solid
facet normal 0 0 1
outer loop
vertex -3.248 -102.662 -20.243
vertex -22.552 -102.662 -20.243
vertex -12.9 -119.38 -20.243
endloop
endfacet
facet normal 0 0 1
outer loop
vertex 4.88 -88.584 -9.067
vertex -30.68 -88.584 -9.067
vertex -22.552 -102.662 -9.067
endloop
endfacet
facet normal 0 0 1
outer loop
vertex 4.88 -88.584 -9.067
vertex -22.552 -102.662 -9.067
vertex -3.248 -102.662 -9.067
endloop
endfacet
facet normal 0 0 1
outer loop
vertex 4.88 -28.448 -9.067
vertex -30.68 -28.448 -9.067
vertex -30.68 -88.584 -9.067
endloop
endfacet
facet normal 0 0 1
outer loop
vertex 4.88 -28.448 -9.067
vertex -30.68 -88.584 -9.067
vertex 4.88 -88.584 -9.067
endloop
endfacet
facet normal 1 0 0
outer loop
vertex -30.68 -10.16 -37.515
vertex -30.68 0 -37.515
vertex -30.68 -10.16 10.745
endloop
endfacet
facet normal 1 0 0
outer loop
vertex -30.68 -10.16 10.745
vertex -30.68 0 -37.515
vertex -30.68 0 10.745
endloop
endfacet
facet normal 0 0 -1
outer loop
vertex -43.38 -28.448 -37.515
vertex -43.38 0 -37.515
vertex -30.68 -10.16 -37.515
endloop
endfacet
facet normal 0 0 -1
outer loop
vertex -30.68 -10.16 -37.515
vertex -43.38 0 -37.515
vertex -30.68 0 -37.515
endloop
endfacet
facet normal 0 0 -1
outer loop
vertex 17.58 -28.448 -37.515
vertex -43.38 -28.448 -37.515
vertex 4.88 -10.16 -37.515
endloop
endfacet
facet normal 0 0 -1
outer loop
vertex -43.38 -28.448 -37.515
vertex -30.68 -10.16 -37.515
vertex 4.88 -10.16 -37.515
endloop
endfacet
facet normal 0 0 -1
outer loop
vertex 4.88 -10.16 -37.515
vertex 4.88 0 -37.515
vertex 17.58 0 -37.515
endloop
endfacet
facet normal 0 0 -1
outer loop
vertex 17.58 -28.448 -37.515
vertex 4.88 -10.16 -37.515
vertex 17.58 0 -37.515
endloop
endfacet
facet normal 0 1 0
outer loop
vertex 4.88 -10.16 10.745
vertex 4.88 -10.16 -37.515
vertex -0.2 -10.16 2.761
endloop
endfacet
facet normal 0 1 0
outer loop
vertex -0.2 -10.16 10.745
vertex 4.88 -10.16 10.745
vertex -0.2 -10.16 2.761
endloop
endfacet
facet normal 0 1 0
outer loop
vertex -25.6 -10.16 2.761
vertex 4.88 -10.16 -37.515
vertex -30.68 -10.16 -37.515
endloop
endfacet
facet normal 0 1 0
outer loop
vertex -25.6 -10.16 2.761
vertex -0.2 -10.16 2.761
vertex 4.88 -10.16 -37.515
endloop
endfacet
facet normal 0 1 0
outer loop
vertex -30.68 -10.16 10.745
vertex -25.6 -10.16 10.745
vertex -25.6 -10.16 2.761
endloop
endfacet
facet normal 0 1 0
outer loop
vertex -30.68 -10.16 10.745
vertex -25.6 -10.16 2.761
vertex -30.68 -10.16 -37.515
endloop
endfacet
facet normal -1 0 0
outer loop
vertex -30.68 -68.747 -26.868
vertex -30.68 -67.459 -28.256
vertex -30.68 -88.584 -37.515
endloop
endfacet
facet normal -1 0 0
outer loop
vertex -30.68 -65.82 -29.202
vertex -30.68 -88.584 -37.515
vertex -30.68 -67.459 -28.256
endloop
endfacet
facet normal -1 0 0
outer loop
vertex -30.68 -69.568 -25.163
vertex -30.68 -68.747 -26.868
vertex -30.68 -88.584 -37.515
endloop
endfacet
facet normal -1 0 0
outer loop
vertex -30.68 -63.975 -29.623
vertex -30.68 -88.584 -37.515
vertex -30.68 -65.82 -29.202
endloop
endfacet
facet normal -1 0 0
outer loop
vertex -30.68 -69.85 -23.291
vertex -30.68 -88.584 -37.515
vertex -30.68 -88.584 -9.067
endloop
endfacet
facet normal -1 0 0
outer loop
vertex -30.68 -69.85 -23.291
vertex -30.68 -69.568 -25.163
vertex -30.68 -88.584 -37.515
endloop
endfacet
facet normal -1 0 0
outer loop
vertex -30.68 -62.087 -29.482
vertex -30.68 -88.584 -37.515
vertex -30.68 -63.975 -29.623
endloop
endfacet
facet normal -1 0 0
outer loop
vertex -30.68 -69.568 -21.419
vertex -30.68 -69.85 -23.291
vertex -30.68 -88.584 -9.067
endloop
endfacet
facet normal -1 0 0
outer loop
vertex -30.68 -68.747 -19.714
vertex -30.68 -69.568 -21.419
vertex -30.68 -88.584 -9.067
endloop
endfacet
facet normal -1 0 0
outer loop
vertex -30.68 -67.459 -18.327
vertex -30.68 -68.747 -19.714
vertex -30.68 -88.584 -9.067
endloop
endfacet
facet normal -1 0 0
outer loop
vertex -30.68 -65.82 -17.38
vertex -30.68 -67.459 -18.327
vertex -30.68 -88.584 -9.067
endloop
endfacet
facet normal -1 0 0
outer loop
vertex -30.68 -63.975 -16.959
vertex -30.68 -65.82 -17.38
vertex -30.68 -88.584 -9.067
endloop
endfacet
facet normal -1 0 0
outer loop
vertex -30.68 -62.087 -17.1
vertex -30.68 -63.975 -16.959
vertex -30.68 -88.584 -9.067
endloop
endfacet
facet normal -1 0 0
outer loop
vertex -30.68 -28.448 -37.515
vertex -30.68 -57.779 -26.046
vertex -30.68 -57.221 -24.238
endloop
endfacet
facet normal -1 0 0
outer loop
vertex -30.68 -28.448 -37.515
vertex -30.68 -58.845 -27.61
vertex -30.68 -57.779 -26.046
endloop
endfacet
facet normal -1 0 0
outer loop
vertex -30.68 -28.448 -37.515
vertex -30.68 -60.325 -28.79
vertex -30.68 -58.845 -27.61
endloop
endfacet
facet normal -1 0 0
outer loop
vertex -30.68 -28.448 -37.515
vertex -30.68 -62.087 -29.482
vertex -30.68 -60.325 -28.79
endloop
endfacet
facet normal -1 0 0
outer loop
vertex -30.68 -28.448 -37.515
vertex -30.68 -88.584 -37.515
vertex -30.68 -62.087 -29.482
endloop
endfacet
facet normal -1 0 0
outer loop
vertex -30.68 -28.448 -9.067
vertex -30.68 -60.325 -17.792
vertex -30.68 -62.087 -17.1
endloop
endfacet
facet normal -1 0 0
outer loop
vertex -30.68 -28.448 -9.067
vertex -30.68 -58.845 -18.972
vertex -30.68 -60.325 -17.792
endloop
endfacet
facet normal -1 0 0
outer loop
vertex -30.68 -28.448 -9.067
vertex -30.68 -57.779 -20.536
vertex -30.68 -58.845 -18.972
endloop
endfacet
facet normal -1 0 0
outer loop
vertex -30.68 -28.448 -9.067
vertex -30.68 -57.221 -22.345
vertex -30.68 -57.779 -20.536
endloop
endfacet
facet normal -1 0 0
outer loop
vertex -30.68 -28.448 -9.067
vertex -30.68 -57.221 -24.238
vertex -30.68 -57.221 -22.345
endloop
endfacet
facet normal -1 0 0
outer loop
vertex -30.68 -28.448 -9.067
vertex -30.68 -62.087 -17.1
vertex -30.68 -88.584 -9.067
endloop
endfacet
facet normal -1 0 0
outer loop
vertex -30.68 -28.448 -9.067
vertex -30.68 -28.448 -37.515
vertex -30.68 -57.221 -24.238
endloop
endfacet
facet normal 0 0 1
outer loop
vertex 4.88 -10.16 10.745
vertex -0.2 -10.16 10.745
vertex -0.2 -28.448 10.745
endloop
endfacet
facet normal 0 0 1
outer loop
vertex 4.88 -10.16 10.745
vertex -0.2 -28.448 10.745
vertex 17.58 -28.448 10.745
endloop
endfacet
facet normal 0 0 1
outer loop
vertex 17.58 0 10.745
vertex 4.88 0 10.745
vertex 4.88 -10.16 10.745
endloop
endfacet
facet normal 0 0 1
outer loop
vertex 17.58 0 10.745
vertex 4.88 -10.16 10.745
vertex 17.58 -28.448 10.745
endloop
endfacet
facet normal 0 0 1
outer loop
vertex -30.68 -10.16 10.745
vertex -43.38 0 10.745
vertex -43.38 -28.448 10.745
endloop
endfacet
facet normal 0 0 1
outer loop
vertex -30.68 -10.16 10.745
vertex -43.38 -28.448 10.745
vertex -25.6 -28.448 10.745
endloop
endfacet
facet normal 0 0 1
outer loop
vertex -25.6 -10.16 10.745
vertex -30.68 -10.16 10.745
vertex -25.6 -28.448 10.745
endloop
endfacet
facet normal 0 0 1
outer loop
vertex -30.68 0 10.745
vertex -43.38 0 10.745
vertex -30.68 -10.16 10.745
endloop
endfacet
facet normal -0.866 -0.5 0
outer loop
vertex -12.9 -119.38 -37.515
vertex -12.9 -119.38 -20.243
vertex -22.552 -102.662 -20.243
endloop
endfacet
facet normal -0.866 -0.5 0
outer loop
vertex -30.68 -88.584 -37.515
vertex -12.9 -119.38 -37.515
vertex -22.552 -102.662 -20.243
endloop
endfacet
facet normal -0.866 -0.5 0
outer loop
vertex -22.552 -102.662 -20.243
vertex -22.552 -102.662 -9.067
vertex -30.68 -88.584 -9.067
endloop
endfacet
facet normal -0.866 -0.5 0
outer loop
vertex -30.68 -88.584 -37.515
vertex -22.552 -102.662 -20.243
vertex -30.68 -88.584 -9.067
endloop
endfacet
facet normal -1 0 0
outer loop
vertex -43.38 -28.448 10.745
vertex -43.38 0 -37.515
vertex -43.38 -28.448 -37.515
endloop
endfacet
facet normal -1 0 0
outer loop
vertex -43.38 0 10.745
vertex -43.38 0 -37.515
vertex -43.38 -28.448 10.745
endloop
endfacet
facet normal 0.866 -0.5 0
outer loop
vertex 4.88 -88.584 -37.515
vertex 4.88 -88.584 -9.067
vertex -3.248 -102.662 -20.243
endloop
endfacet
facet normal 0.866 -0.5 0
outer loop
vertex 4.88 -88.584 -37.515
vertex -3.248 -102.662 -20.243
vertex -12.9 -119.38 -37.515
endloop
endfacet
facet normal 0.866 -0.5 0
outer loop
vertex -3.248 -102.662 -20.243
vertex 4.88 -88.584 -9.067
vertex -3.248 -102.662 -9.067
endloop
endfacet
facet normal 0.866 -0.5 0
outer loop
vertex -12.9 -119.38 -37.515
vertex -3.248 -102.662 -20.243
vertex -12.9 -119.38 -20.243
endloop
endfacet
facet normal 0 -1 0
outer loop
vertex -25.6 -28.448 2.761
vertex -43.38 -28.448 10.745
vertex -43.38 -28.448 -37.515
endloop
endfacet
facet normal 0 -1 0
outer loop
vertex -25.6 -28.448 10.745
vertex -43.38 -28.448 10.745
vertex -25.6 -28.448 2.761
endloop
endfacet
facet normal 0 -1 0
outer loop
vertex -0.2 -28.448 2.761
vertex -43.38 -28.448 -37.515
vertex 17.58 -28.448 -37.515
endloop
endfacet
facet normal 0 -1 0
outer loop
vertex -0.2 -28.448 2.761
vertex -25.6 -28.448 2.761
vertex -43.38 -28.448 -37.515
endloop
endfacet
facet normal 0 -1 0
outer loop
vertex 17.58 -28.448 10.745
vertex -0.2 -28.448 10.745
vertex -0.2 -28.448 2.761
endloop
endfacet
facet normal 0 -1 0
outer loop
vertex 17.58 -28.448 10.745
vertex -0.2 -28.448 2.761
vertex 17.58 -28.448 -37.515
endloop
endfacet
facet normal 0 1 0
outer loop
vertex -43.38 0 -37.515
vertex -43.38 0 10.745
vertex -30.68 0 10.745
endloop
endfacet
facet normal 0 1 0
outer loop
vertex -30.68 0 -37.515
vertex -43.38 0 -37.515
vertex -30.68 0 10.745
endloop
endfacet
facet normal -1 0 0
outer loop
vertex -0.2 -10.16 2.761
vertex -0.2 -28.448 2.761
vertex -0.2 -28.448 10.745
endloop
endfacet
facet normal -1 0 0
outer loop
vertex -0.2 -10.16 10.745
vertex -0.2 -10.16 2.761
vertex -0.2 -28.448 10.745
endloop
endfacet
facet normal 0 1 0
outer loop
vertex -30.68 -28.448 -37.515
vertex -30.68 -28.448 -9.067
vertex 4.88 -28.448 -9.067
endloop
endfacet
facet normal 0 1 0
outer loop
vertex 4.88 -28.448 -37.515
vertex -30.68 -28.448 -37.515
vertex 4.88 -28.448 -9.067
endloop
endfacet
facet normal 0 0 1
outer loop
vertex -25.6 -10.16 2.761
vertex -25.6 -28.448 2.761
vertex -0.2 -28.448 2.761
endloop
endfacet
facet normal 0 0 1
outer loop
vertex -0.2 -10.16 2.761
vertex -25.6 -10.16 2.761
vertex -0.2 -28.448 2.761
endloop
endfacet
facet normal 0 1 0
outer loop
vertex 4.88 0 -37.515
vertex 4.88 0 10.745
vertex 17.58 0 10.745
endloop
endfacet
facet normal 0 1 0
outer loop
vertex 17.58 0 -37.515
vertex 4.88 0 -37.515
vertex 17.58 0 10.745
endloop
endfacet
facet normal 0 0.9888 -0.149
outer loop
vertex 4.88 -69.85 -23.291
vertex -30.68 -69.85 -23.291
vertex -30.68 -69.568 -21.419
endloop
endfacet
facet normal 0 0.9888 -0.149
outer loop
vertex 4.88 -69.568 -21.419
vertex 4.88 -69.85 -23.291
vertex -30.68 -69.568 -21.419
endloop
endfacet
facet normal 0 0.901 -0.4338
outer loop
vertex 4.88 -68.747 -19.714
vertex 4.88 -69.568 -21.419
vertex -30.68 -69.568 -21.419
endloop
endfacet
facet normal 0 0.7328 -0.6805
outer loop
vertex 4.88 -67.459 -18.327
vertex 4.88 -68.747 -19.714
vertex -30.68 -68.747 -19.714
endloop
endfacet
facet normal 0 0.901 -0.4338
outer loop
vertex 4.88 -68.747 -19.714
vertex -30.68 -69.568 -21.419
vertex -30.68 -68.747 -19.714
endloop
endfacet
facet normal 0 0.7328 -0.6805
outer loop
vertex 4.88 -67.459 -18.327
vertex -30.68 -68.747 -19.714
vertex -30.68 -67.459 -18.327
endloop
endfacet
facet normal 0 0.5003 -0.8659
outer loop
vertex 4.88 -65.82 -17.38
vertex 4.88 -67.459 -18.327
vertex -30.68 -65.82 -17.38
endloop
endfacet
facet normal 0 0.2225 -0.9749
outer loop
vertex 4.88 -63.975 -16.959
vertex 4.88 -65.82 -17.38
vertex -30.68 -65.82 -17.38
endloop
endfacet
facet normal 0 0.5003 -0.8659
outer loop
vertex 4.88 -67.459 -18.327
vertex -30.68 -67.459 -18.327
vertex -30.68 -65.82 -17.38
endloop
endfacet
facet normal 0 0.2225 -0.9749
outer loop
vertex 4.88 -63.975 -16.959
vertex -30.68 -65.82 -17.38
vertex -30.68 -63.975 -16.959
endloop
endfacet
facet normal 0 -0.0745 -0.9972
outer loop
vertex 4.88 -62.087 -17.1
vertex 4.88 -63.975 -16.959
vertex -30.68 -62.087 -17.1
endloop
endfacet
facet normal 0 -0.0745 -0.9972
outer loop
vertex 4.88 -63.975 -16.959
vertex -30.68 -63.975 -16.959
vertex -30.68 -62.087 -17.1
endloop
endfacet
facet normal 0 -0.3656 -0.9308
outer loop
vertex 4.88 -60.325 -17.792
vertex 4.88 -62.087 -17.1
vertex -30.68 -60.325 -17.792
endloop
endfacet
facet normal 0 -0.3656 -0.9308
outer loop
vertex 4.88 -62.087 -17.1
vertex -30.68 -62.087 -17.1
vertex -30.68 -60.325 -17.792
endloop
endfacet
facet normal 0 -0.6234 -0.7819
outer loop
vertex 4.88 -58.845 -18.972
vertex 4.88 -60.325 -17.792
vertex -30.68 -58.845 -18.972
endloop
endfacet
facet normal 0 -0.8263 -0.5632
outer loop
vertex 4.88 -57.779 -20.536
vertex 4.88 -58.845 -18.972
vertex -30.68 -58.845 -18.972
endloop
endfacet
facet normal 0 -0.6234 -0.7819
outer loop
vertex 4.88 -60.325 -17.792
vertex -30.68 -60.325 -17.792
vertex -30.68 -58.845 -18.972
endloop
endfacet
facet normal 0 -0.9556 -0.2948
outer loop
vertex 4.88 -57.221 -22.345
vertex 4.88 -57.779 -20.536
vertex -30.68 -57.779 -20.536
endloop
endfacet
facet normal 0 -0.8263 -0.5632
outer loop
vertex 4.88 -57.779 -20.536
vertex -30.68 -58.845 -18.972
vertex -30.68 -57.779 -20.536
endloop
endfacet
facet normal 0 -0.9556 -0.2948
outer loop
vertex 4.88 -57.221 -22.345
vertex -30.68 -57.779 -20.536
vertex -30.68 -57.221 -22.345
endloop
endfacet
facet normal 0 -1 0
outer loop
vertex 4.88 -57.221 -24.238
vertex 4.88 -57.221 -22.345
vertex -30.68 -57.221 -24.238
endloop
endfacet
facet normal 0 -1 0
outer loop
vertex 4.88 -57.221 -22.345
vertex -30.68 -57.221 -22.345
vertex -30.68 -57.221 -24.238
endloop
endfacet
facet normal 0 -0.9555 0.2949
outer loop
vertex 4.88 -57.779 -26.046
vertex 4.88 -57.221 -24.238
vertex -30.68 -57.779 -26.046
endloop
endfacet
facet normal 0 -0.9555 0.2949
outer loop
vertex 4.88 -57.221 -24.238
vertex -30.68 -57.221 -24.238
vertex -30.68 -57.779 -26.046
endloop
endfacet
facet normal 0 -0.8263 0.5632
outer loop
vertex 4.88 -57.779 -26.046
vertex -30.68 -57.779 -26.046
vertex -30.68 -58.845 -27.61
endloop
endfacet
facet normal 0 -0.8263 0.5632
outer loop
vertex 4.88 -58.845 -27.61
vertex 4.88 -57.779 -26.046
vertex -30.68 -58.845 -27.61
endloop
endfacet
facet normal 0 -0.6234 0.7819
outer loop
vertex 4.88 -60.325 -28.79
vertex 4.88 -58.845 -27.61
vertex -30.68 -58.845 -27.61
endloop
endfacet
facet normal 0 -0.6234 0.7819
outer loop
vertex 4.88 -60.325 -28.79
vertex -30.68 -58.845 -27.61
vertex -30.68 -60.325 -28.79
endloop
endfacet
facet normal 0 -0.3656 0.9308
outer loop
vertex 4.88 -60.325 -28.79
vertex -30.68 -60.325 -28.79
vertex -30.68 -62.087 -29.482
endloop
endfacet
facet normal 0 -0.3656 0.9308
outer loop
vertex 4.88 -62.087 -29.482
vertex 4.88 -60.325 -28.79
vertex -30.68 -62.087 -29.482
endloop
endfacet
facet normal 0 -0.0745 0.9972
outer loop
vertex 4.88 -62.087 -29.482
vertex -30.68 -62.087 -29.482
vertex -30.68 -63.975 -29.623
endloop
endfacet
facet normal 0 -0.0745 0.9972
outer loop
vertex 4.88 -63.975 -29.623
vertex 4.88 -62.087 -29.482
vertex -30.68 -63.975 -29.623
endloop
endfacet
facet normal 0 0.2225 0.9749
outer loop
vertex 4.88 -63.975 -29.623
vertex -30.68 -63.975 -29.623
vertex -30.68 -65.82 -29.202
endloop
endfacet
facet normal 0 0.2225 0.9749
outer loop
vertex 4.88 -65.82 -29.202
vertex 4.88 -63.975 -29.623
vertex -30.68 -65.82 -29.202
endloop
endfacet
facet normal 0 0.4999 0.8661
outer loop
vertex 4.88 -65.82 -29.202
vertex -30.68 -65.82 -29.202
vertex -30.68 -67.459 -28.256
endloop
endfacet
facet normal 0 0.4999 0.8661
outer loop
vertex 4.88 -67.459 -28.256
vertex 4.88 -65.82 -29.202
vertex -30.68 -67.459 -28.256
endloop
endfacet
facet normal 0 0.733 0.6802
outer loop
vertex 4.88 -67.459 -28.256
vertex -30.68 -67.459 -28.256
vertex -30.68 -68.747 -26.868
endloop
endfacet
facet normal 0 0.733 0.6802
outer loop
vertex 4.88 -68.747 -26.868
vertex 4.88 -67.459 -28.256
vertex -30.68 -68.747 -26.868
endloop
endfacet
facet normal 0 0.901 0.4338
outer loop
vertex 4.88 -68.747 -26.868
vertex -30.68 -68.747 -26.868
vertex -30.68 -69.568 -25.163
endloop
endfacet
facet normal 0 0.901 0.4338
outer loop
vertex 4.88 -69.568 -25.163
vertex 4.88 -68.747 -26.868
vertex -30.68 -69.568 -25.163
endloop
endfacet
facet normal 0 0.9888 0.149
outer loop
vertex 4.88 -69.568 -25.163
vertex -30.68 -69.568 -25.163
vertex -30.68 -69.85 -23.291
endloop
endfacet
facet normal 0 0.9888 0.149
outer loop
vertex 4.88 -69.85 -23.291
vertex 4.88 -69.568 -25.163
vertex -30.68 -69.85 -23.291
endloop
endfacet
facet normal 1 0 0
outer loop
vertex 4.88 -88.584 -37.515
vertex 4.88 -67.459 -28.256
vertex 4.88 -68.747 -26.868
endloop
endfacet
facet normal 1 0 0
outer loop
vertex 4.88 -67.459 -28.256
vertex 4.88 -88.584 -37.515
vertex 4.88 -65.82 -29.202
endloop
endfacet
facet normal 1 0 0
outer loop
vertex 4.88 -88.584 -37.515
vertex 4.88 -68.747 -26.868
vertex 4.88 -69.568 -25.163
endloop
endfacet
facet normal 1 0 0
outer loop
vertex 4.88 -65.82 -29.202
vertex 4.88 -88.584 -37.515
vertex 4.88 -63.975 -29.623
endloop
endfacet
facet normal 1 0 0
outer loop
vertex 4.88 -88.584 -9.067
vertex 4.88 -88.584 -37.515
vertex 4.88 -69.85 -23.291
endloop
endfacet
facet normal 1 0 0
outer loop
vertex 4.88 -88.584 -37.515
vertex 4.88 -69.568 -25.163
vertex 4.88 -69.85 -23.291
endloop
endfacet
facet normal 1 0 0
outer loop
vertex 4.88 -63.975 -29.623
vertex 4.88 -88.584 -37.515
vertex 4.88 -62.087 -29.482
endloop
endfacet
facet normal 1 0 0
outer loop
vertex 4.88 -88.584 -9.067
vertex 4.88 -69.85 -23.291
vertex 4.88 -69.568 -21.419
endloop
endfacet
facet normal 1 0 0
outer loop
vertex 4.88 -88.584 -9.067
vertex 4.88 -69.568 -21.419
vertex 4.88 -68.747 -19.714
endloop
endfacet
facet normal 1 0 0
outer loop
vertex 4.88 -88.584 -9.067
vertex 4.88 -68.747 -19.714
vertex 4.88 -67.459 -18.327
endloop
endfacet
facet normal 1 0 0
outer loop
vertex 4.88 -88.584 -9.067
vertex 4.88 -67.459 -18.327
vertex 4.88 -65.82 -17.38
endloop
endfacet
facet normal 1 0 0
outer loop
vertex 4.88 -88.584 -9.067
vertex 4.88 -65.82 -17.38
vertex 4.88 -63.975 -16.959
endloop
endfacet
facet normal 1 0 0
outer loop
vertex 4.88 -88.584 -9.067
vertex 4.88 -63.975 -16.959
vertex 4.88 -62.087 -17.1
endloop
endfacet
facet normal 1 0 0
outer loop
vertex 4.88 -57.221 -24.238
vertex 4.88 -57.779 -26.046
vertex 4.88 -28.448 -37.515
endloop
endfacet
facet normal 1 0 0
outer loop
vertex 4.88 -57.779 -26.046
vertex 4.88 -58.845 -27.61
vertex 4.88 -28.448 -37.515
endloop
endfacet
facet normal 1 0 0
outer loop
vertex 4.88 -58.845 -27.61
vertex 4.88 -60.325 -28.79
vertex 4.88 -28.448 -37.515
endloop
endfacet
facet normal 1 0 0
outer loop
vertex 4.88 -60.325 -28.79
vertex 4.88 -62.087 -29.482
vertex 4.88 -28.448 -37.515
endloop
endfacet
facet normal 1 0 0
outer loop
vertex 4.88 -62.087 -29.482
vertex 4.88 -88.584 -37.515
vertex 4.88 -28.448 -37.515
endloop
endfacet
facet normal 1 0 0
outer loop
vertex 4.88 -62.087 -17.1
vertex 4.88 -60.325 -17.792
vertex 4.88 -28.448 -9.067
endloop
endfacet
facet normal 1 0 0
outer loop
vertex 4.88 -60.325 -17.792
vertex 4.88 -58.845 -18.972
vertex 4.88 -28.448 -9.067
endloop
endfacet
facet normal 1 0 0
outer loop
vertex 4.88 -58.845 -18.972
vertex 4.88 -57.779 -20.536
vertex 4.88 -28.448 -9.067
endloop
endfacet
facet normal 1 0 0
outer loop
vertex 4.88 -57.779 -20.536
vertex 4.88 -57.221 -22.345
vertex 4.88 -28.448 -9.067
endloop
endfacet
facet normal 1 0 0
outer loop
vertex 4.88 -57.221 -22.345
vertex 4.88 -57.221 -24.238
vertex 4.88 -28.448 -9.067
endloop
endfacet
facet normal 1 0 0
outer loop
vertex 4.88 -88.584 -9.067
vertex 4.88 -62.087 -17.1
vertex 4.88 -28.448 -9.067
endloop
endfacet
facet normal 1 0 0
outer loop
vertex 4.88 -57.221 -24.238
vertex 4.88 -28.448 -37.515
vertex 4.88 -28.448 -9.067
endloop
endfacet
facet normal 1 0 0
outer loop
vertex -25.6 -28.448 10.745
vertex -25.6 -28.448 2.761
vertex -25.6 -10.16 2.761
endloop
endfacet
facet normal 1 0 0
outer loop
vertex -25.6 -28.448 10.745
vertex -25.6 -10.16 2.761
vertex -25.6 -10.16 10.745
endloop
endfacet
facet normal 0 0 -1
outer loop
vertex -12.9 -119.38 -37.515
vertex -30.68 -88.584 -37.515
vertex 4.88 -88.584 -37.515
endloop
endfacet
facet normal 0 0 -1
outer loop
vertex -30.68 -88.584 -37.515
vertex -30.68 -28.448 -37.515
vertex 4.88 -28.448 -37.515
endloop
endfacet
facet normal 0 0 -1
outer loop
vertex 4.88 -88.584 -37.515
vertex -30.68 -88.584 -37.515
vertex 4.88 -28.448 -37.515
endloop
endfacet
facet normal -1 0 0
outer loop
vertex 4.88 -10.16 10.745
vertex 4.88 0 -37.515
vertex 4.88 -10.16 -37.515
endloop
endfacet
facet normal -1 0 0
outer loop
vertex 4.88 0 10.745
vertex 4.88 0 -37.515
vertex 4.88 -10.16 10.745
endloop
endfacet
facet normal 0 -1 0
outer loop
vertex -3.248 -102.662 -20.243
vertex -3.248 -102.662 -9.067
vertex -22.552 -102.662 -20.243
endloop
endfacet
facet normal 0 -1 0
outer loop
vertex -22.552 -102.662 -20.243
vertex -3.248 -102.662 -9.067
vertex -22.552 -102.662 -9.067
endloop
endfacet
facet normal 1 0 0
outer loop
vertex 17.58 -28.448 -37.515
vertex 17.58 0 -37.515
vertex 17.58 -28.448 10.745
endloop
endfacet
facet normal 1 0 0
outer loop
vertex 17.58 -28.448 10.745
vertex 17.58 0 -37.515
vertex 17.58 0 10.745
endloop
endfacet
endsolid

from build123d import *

# Parameters (mm, degrees)
F0_W      = 60.96
F0_H      = 48.26
F1_DEPTH  = 28.448
F2_W      = 25.4
F2_H      = 7.98411
F3_DEPTH  = 30.226
F4_W      = 35.56
F4_H      = 48.26
F5_DEPTH  = 10.16
F6_W      = 35.56
F6_H      = 28.448
F7_DEPTH  = 90.932
F8_R      = 6.35
F9_DEPTH  = 42.164
F11_DEPTH = 32.766
F13_DEPTH = 11.176


with BuildPart() as f1:
    # F0 (on Front) → F1 (new body)
    with BuildSketch(Plane.XZ):
        with Locations((-12.900013, -13.385132)):
            Rectangle(F0_W, F0_H)
    extrude(amount=F1_DEPTH)

    # F2 (on face) → F3 (cut)
    with BuildSketch(Plane.XZ.offset(28.448)):
        with Locations((-12.900013, 6.752813)):
            Rectangle(F2_W, F2_H)
    extrude(amount=-F3_DEPTH, mode=Mode.SUBTRACT)

    # F4 (on face) → F5 (cut)
    with BuildSketch(Plane(origin=(0, 0, 0), x_dir=(-1, 0, 0), z_dir=(0, 1, 0))):
        with Locations((12.900013, -13.385132)):
            Rectangle(F4_W, F4_H)
    extrude(amount=-F5_DEPTH, mode=Mode.SUBTRACT)


with BuildPart() as f7:
    # F6 (on face) → F7 (new body)
    with BuildSketch(Plane.XZ.offset(28.448)):
        with Locations((-12.900013, -23.291132)):
            Rectangle(F6_W, F6_H)
    extrude(amount=F7_DEPTH)

    # F8 (on face) → F9 (cut)
    with BuildSketch(Plane(origin=(-30.680013, 0, 0), x_dir=(0, -1, 0), z_dir=(-1, 0, 0))):
        with Locations((63.5, -23.291132)):
            Circle(F8_R)
    extrude(amount=-F9_DEPTH, mode=Mode.SUBTRACT)

    # F10 (on face) → F11 (cut)
    with BuildSketch(Plane.XY.offset(-9.067132)):
        Polygon((-30.680013, -119.38), (-12.900013, -119.38), (-30.680013, -88.584137), align=None)
        Polygon((4.879987, -88.584137), (-12.900013, -119.38), (4.879987, -119.38), align=None)
    extrude(amount=-F11_DEPTH, mode=Mode.SUBTRACT)

    # F12 (on face) → F13 (cut)
    with BuildSketch(Plane.XY.offset(-9.067132)):
        Polygon((-22.552013, -102.662246), (-12.900013, -119.38), (-3.248013, -102.662246), align=None)
    extrude(amount=-F13_DEPTH, mode=Mode.SUBTRACT)


solid = Compound([f1.part, f7.part])
